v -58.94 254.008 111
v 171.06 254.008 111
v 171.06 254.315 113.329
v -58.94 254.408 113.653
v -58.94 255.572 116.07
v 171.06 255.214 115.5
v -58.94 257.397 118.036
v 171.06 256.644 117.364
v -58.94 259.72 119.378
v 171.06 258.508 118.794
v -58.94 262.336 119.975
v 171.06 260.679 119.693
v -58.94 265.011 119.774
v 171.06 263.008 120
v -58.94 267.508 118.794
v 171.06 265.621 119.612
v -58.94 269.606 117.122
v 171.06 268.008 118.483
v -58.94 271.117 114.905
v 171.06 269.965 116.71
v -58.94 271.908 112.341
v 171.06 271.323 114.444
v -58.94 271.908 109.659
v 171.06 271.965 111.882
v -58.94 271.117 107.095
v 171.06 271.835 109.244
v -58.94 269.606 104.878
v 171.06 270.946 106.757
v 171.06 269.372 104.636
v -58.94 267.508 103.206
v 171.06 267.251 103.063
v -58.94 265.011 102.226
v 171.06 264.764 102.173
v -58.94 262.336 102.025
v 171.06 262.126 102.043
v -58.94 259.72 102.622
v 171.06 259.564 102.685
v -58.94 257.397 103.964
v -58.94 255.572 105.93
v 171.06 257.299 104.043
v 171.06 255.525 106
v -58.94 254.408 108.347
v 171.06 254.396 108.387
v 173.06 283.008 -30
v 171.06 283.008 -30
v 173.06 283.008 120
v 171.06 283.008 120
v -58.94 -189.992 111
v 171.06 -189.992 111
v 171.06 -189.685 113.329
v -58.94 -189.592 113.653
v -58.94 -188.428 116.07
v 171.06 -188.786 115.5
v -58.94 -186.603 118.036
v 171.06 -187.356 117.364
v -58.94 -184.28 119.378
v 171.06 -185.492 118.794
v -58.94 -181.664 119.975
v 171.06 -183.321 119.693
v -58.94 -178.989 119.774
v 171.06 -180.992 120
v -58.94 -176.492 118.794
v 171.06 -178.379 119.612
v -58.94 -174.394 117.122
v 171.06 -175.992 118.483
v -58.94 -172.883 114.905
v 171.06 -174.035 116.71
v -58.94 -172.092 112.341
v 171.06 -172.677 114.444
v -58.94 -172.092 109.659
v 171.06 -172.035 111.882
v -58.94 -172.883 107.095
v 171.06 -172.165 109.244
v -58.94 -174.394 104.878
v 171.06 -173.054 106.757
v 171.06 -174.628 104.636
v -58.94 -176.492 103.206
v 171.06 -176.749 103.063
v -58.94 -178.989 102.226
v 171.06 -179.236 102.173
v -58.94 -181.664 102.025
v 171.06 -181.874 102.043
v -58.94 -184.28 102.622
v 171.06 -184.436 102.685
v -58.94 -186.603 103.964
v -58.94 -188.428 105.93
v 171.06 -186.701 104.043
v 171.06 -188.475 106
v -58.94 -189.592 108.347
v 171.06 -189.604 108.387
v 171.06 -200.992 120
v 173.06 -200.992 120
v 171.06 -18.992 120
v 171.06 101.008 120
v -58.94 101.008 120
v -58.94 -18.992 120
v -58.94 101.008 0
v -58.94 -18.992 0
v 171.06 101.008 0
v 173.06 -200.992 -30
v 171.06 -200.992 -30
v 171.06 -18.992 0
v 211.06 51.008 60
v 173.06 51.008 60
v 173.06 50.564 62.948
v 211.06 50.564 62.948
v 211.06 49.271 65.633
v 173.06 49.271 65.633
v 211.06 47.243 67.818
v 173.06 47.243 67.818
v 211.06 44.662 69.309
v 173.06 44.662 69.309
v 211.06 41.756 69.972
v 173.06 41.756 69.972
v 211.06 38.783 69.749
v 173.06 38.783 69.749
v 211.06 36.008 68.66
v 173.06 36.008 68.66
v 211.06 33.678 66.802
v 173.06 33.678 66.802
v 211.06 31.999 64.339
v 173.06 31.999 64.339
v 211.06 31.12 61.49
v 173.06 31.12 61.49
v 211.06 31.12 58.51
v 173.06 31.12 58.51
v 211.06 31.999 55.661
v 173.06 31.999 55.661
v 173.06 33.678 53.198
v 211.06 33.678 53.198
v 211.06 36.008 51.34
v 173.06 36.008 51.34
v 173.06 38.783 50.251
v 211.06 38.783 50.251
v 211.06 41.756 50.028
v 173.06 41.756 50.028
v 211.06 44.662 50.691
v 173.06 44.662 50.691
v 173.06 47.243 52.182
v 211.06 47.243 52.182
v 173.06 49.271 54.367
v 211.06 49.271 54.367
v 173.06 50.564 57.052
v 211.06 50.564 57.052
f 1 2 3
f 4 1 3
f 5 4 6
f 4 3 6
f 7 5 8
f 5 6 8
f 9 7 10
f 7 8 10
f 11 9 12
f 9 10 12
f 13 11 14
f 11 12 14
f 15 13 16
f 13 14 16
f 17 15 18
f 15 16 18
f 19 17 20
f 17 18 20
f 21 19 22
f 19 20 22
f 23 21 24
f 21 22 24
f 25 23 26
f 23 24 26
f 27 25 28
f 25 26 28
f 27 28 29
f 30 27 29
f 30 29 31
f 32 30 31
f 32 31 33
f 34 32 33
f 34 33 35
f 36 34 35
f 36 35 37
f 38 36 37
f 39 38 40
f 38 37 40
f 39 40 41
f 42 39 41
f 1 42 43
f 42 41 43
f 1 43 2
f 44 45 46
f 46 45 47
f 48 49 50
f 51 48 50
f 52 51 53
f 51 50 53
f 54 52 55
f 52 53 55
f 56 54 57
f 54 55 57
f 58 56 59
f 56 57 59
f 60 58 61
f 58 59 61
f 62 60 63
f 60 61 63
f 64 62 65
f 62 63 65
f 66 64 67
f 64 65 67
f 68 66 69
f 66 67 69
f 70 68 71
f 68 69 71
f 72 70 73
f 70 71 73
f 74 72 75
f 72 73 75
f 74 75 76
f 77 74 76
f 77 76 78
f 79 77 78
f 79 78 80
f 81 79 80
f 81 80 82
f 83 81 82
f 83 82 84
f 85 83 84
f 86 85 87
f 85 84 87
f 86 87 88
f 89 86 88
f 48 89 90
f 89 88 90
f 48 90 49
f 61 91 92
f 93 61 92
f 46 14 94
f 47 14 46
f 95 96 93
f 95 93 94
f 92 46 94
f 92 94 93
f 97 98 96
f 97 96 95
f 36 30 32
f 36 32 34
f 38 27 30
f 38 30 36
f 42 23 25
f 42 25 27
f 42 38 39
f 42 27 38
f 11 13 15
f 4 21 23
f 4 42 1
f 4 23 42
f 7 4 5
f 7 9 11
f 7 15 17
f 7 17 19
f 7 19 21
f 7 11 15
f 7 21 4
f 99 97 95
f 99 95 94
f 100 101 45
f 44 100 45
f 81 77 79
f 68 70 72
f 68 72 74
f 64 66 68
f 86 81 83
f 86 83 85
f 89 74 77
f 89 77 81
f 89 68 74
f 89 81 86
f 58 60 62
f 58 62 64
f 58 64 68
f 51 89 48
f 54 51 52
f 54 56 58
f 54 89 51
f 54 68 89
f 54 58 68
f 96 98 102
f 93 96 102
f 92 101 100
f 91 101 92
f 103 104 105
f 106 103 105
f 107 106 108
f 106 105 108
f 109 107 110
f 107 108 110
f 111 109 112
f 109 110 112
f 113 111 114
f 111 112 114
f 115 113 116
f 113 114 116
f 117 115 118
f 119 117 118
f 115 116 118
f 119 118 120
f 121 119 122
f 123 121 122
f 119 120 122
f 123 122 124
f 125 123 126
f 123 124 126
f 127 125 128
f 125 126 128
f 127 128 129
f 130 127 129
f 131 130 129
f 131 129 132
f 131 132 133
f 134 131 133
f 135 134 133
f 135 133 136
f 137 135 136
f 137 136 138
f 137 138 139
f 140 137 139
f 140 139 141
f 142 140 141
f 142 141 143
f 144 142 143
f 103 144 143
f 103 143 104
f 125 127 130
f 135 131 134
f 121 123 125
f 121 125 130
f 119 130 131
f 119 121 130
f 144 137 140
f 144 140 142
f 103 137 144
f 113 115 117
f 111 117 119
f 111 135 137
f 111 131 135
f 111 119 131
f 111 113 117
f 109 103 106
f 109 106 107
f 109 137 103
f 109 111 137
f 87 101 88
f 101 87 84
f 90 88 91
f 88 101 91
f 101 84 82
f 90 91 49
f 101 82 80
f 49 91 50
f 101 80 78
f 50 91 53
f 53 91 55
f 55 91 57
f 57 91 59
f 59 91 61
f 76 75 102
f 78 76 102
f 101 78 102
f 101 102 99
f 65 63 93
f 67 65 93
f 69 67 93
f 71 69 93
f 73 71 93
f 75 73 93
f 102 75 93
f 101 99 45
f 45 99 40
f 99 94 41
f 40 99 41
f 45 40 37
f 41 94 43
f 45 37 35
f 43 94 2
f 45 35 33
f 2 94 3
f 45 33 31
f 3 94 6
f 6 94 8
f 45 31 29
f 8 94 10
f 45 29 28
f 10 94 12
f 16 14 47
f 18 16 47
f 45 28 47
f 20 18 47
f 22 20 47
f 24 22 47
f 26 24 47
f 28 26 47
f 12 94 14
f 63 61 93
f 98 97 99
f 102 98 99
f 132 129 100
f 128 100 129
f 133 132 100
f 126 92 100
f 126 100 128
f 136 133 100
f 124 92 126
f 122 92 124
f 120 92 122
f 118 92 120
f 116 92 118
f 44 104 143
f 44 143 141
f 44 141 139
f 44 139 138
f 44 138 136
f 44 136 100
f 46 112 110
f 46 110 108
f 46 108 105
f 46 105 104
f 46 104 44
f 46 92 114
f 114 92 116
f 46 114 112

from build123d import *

# Parameters (mm, degrees)
F0_W     = 230
F0_H     = 120
F1_DEPTH = 120
F2_R     = 10
F3_DEPTH = 40
F4_W     = 484
F4_H     = 150
F5_DEPTH = 2
F6_R     = 9
F7_DEPTH = 230


with BuildPart() as f1:
    # F0 (on Top) → F1 (new body)
    with BuildSketch(Plane.XY):
        with Locations((56.06029, 41.008315)):
            Rectangle(F0_W, F0_H)
    extrude(amount=F1_DEPTH)

    # F2 (on face) → F3 (join)
    with BuildSketch(Plane.YZ.offset(171.06029)):
        with Locations((41.008315, 60)):
            Circle(F2_R)
    extrude(amount=F3_DEPTH)

    # F4 (on face) → F5 (join)
    with BuildSketch(Plane.YZ.offset(171.06029)):
        with Locations((41.008315, 45)):
            Rectangle(F4_W, F4_H)
    extrude(amount=F5_DEPTH)

    # F6 (on face) → F7 (join)
    with BuildSketch(Plane(origin=(171.06029, 0, 0), x_dir=(0, -1, 0), z_dir=(-1, 0, 0))):
        with Locations((180.991685, 111)):
            Circle(F6_R)
        with Locations((-263.008315, 111)):
            Circle(F6_R)
    extrude(amount=F7_DEPTH)


solid = f1.part
